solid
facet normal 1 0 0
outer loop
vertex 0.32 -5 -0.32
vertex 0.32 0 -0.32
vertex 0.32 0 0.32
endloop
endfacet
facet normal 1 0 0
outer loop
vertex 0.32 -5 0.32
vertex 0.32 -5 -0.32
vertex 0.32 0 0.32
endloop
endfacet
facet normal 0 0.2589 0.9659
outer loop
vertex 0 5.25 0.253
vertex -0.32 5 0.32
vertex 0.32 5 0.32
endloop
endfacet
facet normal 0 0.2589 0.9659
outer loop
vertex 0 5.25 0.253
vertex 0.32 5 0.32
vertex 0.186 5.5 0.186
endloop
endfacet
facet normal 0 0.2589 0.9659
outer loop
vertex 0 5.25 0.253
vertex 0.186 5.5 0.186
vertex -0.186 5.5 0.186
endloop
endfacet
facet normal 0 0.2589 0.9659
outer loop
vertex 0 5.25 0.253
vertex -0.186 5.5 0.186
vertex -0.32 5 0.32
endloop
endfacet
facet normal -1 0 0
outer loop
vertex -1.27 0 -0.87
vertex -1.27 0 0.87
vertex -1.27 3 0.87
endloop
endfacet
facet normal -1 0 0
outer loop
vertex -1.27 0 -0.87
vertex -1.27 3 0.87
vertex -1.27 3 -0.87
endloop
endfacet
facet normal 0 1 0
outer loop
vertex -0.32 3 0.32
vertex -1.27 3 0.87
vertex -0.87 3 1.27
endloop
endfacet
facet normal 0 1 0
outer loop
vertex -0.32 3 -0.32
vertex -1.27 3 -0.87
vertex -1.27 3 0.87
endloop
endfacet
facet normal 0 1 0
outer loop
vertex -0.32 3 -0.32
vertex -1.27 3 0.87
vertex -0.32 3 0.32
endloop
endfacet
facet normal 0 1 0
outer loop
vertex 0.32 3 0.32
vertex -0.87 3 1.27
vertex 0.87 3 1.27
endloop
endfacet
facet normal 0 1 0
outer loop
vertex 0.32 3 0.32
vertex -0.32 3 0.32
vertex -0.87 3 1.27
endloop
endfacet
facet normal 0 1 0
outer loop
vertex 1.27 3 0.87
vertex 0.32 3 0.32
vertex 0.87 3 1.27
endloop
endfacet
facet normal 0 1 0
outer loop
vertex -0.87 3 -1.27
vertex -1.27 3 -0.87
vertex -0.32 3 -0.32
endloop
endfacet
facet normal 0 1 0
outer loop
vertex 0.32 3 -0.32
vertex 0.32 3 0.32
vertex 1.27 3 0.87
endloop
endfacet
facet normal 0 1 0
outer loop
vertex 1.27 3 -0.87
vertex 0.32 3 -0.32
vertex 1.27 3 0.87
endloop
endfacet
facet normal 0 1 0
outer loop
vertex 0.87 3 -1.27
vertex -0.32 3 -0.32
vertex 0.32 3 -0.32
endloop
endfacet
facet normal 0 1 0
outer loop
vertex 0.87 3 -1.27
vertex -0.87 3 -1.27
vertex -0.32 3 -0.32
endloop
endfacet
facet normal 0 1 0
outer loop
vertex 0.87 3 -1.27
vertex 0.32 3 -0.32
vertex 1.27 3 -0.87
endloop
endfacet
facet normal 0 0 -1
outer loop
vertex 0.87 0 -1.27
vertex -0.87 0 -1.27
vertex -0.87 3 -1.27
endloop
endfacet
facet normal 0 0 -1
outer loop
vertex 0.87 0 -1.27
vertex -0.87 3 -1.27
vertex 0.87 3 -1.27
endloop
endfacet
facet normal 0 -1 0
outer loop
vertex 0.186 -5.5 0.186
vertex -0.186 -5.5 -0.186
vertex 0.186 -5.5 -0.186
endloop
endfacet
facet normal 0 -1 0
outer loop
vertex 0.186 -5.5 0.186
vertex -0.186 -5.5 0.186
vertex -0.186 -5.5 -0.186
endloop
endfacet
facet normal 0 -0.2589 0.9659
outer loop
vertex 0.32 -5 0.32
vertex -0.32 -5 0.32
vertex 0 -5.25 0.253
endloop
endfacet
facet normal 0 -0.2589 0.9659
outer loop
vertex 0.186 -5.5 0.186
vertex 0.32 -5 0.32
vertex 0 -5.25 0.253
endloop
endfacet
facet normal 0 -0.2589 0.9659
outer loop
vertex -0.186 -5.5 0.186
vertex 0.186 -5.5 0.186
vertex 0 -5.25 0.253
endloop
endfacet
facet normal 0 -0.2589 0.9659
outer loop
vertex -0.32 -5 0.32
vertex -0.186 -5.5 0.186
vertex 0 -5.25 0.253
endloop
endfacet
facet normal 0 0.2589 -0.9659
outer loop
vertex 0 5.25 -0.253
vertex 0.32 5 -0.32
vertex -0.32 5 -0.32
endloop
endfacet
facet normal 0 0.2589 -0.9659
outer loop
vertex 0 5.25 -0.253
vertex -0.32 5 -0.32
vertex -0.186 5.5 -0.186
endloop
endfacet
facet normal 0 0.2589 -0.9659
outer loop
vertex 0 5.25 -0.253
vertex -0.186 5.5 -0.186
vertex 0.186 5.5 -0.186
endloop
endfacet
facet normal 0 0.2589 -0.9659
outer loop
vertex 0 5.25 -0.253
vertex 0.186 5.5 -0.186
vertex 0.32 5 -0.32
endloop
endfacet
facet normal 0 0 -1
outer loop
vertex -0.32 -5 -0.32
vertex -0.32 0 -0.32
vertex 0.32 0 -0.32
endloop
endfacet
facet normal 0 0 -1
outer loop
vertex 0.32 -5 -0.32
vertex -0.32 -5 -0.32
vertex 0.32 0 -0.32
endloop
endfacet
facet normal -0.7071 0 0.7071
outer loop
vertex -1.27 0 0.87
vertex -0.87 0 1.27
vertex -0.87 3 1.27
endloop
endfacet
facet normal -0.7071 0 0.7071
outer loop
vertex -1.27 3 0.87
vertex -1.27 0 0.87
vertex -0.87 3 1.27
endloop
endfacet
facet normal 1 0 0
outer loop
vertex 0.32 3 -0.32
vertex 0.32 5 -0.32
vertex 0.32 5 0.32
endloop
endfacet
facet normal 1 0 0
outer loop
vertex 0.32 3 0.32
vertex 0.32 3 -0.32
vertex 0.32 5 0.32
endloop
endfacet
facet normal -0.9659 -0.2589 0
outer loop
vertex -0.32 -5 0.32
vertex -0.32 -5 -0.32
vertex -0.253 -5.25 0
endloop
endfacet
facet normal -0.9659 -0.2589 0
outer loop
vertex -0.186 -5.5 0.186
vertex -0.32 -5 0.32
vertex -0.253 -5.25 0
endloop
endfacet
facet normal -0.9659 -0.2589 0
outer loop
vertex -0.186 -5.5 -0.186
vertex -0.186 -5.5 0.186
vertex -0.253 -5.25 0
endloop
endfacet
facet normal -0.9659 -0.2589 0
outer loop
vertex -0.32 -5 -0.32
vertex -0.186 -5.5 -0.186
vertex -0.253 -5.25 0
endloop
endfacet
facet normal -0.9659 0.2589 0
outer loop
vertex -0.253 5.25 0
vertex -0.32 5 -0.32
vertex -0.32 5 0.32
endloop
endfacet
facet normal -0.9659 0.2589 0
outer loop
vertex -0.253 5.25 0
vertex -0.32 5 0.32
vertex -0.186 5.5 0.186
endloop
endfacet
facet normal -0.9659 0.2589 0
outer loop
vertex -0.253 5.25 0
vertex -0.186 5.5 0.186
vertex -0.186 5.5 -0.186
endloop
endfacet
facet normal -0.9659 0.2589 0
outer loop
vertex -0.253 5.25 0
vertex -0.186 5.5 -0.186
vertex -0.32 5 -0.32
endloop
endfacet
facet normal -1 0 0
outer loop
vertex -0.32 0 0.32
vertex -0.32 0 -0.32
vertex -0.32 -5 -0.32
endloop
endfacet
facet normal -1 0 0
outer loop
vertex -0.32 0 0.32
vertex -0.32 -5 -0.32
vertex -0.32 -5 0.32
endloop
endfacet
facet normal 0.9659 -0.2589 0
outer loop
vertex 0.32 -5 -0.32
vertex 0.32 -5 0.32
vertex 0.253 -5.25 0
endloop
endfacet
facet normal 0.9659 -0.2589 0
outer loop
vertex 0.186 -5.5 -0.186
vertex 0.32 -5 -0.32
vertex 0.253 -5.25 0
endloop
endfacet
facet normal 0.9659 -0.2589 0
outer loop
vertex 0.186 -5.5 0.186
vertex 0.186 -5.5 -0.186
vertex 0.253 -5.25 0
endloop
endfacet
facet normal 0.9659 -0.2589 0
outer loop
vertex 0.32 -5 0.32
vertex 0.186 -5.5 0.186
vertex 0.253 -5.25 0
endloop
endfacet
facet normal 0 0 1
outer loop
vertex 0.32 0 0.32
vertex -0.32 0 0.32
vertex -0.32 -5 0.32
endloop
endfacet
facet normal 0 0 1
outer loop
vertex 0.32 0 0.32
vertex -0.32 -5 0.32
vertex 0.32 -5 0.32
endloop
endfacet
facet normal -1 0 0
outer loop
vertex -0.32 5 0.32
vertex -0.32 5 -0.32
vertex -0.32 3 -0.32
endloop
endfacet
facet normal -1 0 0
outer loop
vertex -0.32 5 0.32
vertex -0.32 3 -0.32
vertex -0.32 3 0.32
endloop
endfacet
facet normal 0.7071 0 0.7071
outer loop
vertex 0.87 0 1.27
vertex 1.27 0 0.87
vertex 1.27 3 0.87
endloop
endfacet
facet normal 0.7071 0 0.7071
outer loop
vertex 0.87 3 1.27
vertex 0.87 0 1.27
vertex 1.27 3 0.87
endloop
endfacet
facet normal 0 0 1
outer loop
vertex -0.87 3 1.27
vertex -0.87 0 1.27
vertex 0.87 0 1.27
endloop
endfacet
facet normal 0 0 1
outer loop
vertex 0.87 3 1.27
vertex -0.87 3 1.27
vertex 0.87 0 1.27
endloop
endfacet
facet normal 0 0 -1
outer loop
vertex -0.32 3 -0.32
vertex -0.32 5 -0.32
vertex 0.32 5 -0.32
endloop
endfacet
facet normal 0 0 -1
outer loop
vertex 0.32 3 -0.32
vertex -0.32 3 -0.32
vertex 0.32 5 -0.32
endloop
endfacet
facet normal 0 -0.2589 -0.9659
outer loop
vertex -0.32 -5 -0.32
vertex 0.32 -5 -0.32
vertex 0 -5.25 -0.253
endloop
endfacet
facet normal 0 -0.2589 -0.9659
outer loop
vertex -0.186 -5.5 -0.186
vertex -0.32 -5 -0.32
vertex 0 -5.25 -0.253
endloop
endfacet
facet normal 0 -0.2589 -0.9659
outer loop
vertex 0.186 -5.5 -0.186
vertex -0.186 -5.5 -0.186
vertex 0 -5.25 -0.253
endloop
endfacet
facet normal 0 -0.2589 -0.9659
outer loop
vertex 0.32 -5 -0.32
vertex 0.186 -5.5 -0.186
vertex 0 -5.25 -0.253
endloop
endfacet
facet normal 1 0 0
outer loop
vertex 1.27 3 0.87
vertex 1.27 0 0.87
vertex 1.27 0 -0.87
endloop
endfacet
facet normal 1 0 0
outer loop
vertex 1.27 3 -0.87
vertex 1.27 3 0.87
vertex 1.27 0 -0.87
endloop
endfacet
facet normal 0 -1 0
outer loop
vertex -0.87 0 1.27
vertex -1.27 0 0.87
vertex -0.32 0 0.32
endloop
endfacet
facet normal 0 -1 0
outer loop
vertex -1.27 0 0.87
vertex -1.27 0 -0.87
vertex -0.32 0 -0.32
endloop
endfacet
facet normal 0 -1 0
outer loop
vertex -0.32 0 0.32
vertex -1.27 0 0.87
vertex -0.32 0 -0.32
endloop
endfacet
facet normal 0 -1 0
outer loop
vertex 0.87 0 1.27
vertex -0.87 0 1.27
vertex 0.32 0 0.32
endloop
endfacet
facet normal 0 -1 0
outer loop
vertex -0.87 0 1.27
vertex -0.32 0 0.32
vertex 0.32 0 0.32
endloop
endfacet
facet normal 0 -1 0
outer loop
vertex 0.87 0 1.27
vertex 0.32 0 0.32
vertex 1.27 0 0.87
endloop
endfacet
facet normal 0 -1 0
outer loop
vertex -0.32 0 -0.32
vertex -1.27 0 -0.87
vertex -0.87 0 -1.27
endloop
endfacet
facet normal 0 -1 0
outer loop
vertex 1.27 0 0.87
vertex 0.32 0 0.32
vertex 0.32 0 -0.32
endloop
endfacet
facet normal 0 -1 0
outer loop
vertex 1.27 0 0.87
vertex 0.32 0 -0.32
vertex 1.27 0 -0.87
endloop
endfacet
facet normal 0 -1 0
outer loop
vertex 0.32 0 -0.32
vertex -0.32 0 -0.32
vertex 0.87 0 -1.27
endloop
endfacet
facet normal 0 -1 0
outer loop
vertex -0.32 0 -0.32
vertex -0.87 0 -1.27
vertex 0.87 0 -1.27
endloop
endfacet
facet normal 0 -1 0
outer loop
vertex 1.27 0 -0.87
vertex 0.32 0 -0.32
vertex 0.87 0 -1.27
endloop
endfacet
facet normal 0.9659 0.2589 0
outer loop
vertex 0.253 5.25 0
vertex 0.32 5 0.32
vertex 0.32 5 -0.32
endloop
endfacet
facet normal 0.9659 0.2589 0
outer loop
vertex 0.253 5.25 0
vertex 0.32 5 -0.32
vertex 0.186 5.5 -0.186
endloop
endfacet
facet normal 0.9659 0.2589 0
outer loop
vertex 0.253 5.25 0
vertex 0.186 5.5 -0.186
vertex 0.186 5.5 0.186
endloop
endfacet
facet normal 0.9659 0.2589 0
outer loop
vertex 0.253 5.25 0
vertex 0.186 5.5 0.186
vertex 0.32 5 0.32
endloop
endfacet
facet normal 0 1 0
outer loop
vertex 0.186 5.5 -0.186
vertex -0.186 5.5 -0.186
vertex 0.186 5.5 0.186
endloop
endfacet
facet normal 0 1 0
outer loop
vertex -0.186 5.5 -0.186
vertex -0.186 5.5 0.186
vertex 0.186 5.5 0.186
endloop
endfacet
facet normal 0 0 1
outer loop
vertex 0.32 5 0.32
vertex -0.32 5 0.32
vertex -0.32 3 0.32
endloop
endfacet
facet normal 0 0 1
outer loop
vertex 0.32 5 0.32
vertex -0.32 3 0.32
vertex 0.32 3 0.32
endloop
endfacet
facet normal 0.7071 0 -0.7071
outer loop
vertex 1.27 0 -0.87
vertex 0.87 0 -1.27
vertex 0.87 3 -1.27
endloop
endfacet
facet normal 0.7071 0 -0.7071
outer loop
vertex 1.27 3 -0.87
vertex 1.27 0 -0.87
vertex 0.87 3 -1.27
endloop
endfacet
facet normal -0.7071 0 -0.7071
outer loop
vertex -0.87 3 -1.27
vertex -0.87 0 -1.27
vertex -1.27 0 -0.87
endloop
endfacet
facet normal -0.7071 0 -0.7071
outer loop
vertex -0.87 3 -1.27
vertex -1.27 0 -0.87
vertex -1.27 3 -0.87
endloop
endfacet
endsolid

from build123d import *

# Parameters (mm, degrees)
SKETCH1_W                = 2.54
SKETCH1_H                = 2.54
BOSS_EXTRUDE1_DEPTH      = 3
CHAMFER1_SIZE            = 0.4
BOSS_EXTRUDE2_DEPTH      = 5
BOSS_EXTRUDE2_DEPTH_BACK = 5
SKETCH2_W                = 0.64
SKETCH2_H                = 0.64
SKETCH3_W                = 0.64
SKETCH3_H                = 0.64
BOSS_EXTRUDE3_DEPTH      = 0.5
BOSS_EXTRUDE3_TAPER      = 15


with BuildPart() as part:
    # Sketch1 → Boss-Extrude1 (new body)
    with BuildSketch(Plane(origin=(0, 0, 0), x_dir=(1, 0, 0), z_dir=(0, 1, 0))):
        Rectangle(SKETCH1_W, SKETCH1_H)
    extrude(amount=BOSS_EXTRUDE1_DEPTH)

    # Chamfer1
    chamfer1_edges = [part.edges().sort_by_distance(p)[0] for p in [
        (1.27, 1.5, 1.27),
        (-1.27, 1.5, 1.27),
        (-1.27, 1.5, -1.27),
        (1.27, 1.5, -1.27),
    ]]
    chamfer(chamfer1_edges, length=CHAMFER1_SIZE)

    # Sketch2 → Boss-Extrude2 (add, two sides: drawn at the far end of the back side and taken through both)
    with BuildSketch(Plane.XZ.offset(-BOSS_EXTRUDE2_DEPTH_BACK)):
        Rectangle(SKETCH2_W, SKETCH2_H)
    extrude(amount=BOSS_EXTRUDE2_DEPTH + BOSS_EXTRUDE2_DEPTH_BACK)

    # Sketch3 → Boss-Extrude3 (add)
    with BuildSketch(Plane(origin=(0, 5, 0), x_dir=(1, 0, 0), z_dir=(0, 1, 0))):
        Rectangle(SKETCH3_W, SKETCH3_H)
    boss_extrude3 = extrude(amount=BOSS_EXTRUDE3_DEPTH, taper=BOSS_EXTRUDE3_TAPER)

    # Mirror1: Boss-Extrude3 across plane
    add(boss_extrude3.mirror(Plane.ZX))


solid = part.part
